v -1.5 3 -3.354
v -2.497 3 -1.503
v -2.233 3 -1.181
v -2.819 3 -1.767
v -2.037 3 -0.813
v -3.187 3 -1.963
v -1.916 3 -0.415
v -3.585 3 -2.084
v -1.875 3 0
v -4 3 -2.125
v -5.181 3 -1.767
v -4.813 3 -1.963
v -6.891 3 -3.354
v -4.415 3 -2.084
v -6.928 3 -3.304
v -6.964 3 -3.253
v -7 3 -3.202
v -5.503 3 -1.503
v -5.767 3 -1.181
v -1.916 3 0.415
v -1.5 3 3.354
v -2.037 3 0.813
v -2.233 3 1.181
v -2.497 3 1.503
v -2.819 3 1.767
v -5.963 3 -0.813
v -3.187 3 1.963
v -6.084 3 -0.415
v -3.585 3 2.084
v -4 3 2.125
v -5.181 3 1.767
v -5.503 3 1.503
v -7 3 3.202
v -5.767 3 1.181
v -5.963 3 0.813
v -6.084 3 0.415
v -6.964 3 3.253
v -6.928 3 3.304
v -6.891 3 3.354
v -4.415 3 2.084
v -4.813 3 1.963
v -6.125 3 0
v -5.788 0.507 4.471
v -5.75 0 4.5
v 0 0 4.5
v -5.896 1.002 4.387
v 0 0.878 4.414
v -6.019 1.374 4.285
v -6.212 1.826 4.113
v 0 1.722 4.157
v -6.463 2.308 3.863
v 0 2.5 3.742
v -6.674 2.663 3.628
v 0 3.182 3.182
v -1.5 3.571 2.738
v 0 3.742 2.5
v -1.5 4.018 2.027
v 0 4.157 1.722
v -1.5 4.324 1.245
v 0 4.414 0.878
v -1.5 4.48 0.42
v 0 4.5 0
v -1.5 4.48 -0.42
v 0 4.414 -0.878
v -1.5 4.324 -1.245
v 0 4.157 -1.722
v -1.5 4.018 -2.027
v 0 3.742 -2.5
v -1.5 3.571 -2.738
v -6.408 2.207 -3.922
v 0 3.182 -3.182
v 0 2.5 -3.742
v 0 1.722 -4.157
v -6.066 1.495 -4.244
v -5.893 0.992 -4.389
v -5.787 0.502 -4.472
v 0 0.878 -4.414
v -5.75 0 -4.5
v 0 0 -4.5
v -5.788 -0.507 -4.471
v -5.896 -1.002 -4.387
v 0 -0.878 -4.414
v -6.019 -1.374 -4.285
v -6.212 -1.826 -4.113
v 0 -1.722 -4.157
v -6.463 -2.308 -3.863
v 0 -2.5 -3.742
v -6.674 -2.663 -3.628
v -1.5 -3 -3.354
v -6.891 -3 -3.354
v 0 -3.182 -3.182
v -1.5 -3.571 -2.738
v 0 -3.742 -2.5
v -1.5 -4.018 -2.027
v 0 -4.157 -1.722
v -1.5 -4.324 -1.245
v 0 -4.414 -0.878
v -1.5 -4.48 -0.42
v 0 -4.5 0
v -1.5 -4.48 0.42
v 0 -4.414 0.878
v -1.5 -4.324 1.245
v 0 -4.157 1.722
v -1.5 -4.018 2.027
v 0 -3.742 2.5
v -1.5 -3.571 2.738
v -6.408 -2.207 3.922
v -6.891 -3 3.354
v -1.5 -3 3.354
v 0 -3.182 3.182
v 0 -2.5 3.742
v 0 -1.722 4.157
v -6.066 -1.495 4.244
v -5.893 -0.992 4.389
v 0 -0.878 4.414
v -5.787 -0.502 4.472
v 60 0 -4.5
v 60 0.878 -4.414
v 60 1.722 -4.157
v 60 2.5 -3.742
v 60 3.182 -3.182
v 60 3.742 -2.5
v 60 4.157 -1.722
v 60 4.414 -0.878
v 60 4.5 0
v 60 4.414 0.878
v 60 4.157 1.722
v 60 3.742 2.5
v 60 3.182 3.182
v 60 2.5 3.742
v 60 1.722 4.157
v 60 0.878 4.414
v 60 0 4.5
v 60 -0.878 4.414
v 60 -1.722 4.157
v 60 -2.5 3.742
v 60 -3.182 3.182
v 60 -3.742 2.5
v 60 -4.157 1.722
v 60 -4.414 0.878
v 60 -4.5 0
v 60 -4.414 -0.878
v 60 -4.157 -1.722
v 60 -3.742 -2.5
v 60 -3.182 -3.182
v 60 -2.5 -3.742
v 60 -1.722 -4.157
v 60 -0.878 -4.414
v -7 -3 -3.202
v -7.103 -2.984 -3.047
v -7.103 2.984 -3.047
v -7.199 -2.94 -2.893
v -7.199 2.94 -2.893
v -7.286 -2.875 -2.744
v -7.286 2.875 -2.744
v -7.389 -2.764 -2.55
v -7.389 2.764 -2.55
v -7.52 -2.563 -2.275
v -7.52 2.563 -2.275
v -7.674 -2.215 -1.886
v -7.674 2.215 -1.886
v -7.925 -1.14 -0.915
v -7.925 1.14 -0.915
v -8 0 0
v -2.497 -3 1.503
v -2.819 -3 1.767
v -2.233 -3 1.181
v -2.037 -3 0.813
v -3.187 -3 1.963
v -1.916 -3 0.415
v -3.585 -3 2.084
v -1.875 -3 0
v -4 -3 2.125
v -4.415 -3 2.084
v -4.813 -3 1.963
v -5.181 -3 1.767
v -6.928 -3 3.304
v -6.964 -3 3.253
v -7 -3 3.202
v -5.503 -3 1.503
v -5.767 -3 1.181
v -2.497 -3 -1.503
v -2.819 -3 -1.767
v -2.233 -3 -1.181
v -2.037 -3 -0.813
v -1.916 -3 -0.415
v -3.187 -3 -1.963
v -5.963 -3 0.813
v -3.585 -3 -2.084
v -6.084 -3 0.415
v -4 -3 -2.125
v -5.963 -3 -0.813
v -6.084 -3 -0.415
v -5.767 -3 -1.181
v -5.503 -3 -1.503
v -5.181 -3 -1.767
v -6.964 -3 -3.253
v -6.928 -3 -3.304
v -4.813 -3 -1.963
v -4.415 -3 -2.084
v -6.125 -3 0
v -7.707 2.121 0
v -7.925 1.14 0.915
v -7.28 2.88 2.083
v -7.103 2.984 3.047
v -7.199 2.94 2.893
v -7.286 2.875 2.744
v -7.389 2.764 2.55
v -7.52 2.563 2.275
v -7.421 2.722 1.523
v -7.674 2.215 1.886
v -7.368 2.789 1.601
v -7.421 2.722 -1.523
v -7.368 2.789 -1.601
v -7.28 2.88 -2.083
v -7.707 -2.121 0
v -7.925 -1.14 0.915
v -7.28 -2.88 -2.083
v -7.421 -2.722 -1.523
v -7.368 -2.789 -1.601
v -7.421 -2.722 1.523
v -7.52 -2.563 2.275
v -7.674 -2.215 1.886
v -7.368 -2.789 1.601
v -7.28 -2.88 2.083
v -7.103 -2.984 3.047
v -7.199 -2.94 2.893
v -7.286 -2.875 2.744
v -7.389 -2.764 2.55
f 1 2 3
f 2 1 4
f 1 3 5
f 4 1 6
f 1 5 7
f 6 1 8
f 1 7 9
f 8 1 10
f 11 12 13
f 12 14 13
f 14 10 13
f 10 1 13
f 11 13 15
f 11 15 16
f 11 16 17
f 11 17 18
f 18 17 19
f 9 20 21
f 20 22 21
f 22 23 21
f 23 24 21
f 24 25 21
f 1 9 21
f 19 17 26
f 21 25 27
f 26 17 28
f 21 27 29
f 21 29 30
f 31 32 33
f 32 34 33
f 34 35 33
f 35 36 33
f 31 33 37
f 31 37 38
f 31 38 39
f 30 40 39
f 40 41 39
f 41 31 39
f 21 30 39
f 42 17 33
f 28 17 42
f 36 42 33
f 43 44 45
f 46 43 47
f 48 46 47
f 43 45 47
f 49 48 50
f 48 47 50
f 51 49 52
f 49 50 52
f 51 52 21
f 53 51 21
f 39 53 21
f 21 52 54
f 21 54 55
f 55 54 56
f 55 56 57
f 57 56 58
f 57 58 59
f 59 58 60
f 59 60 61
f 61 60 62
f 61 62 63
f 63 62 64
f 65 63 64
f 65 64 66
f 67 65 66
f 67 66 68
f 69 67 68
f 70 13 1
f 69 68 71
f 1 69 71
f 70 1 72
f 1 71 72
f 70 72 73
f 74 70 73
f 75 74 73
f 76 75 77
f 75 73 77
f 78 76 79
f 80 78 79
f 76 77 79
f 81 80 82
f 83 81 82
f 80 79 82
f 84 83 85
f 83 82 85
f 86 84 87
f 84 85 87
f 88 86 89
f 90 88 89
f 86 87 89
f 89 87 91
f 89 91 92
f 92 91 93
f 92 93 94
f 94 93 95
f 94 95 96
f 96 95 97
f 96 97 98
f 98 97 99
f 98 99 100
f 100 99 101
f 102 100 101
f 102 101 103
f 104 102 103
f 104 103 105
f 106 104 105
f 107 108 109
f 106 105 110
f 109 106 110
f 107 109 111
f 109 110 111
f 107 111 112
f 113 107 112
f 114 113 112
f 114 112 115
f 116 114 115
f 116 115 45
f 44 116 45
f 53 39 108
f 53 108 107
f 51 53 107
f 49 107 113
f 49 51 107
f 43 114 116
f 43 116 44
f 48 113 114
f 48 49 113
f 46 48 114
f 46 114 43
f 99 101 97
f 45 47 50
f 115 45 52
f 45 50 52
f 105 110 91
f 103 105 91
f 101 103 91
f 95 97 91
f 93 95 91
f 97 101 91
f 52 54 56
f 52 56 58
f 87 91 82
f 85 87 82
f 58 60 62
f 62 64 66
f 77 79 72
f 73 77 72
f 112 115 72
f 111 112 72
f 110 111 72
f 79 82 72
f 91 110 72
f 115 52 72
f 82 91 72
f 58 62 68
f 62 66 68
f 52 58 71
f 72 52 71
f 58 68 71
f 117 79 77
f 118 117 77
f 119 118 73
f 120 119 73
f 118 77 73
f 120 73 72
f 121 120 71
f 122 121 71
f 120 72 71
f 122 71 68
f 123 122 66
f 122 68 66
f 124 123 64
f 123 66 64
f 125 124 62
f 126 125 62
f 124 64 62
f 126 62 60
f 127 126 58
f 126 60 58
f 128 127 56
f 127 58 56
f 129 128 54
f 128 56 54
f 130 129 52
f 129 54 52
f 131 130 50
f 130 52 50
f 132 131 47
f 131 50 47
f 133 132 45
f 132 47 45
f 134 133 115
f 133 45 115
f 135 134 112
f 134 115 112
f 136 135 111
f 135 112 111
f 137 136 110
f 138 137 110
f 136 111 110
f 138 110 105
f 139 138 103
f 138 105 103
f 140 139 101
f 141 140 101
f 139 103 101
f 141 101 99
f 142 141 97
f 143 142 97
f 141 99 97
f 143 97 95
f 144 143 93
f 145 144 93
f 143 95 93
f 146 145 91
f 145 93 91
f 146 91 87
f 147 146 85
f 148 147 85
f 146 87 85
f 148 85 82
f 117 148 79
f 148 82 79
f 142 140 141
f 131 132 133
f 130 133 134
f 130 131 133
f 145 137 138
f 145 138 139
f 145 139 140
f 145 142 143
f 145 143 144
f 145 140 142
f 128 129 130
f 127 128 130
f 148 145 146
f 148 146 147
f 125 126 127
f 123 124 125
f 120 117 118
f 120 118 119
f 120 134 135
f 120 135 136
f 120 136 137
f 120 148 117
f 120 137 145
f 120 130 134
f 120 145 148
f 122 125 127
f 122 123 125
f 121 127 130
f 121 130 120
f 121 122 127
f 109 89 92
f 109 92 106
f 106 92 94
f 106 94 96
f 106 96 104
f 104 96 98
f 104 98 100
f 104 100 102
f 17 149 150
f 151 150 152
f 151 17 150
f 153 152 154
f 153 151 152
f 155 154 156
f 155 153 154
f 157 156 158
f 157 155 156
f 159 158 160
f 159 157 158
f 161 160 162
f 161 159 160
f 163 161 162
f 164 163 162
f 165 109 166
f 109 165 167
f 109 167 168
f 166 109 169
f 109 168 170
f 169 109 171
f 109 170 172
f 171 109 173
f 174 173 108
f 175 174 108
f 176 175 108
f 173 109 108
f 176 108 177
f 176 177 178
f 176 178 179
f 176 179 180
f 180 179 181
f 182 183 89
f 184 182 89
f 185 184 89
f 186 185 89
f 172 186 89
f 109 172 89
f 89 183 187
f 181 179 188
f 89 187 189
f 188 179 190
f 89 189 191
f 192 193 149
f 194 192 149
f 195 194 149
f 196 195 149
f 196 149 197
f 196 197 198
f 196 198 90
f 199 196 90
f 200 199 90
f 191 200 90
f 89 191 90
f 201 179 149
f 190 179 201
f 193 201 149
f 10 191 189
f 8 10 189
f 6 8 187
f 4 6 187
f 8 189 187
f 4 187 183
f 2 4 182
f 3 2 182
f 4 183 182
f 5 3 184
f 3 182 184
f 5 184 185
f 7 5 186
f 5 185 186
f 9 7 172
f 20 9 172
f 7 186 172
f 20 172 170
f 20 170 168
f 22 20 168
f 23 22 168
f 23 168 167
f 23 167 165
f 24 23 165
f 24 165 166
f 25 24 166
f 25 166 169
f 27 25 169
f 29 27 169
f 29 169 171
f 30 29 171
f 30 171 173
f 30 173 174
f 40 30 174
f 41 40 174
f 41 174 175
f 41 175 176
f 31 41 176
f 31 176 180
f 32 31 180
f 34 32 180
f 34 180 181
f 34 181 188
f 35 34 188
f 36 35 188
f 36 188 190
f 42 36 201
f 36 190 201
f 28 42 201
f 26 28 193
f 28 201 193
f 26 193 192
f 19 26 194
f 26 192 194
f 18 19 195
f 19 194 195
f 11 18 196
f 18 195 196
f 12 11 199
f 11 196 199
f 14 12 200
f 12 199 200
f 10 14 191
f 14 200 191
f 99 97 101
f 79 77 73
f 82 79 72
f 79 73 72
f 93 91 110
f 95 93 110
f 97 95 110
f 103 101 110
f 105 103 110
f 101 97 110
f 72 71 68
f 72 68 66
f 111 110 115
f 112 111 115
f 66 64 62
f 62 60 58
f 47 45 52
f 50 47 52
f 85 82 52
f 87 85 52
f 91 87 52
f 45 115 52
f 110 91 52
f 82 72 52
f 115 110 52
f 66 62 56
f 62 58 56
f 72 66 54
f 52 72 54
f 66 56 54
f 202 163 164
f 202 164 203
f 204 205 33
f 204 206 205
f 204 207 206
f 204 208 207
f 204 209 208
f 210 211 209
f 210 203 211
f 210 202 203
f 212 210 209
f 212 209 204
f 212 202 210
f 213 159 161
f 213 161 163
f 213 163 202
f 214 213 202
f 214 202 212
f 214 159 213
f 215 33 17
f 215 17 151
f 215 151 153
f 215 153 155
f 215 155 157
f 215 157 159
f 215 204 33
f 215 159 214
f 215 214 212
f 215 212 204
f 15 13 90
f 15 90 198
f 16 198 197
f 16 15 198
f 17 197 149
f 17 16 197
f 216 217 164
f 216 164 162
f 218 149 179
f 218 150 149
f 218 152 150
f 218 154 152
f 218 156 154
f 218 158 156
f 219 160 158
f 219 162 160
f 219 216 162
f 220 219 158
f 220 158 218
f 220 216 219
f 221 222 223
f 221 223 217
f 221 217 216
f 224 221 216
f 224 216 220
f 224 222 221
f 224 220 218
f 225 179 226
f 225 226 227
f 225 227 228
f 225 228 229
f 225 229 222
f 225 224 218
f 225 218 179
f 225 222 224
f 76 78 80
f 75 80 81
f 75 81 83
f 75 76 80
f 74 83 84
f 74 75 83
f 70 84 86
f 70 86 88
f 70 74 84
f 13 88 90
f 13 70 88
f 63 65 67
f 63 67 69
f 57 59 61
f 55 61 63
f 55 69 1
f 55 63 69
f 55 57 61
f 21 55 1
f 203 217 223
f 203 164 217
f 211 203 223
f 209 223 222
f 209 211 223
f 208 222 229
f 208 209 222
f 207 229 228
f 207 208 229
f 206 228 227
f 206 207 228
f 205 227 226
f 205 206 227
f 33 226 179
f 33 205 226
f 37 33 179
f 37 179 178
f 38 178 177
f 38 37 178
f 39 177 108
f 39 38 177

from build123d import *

# Parameters (mm, degrees)
SKETCH2_R               = 4.5
BOSS_EXTRUDE1_DEPTH     = 60
SKETCH3_R               = 4.5
BOSS_EXTRUDE2_DEPTH     = 8
CUT_EXTRUDE1_DEPTH      = 6.5
SKETCH5_R               = 2.125
CUT_EXTRUDE2_DEPTH      = 61.634148794
FILLET2_SIZE            = 3
FILLET2_SIZE_2          = 1
FILLET3_SIZE            = 3
FILLET3_SIZE_2          = 1
CUT_EXTRUDE5_DEPTH      = 61.634148814
CUT_EXTRUDE5_DEPTH_BACK = 61.634148814


with BuildPart() as part:
    # Sketch2 → Boss-Extrude1 (new body)
    with BuildSketch(Plane(origin=(0, 0, 0), x_dir=(0, 0, -1), z_dir=(1, 0, 0))):
        Circle(SKETCH2_R)
    extrude(amount=BOSS_EXTRUDE1_DEPTH)


with BuildPart() as body_2:
    # Sketch3 → Boss-Extrude2 (new body)
    with BuildSketch(Plane.ZY):
        Circle(SKETCH3_R)
    extrude(amount=BOSS_EXTRUDE2_DEPTH)

    # Sketch4 → Cut-Extrude1 (cut)
    with BuildSketch(Plane.ZY.offset(8)):
        with BuildLine():
            ThreePointArc((3.354101966, 3), (0, 4.5), (-3.354101966, 3))
            Line((-3.354101966, 3), (3.354101966, 3))
        make_face()
        with BuildLine():
            Line((3.354101966, -3), (-3.354101966, -3))
            ThreePointArc((-3.354101966, -3), (0, -4.5), (3.354101966, -3))
        make_face()
    extrude(amount=-CUT_EXTRUDE1_DEPTH, mode=Mode.SUBTRACT)

    # Sketch5 → Cut-Extrude2 (cut, through all)
    with BuildSketch(Plane.XZ.offset(3)):
        with Locations(Location((-4, 0, 0), (0, 0, 270))):
            Circle(SKETCH5_R)
    extrude(amount=-CUT_EXTRUDE2_DEPTH, mode=Mode.SUBTRACT)

    # Fillet2
    # an asymmetric fillet: 3, 1 mm, written as the material it takes off along each edge
    with BuildSketch(Plane(origin=(-8, -3, 10.854101966), x_dir=(0, 1, 0), z_dir=(0, 0, -1))) as fillet2_piece_1:
        with BuildLine():
            Bezier((FILLET2_SIZE, 0), (0, 0), (0, FILLET2_SIZE_2), weights=[1, 0.707106781, 1])
            Line((0, FILLET2_SIZE_2), (0, 0))
            Line((0, 0), (FILLET2_SIZE, 0))
        make_face()
    extrude(amount=21.708203932, mode=Mode.SUBTRACT)

    # Fillet3
    # an asymmetric fillet: 3, 1 mm, written as the material it takes off along each edge
    with BuildSketch(Plane(origin=(-8, 3, -10.854101966), x_dir=(0, -1, 0), z_dir=(0, 0, 1))) as fillet3_piece_1:
        with BuildLine():
            Bezier((FILLET3_SIZE, 0), (0, 0), (0, FILLET3_SIZE_2), weights=[1, 0.707106781, 1])
            Line((0, FILLET3_SIZE_2), (0, 0))
            Line((0, 0), (FILLET3_SIZE, 0))
        make_face()
    extrude(amount=21.708203932, mode=Mode.SUBTRACT)

    # Sketch8 → Cut-Extrude5 (cut, two sides: drawn at the far end of the back side and taken through both)
    with BuildSketch(Plane.XZ.offset(3).offset(-CUT_EXTRUDE5_DEPTH_BACK)):
        with BuildLine():
            Line((-7, -3.354101966), (-6.890597967, -3.354101966))
            ThreePointArc((-6.890597967, -3.354101966), (-6.945935342, -3.278288441), (-7, -3.201562119))
            Line((-7, -3.201562119), (-7, -3.354101966))
        make_face()
        with BuildLine():
            Line((-8, -4.5), (-5.75, -4.5))
            ThreePointArc((-5.75, -4.5), (-6.361684668, -3.968245249), (-6.890597967, -3.354101966))
            Line((-6.890597967, -3.354101966), (-7, -3.354101966))
            Line((-7, -3.354101966), (-7, -3.201562119))
            ThreePointArc((-7, -3.201562119), (-7.744182899, -1.677050983), (-8, 0))
            Line((-8, 0), (-8, -4.5))
        make_face()
        with BuildLine():
            Line((-7, 3.354101966), (-7, 3.201562119))
            ThreePointArc((-7, 3.201562119), (-6.945935342, 3.278288441), (-6.890597967, 3.354101966))
            Line((-6.890597967, 3.354101966), (-7, 3.354101966))
        make_face()
        with BuildLine():
            Line((-8, 4.5), (-8, 0))
            ThreePointArc((-8, 0), (-7.744182899, 1.677050983), (-7, 3.201562119))
            Line((-7, 3.201562119), (-7, 3.354101966))
            Line((-7, 3.354101966), (-6.890597967, 3.354101966))
            ThreePointArc((-6.890597967, 3.354101966), (-6.361684668, 3.968245249), (-5.75, 4.5))
            Line((-5.75, 4.5), (-8, 4.5))
        make_face()
    extrude(amount=CUT_EXTRUDE5_DEPTH + CUT_EXTRUDE5_DEPTH_BACK, mode=Mode.SUBTRACT)


solid = Compound([part.part, body_2.part])
